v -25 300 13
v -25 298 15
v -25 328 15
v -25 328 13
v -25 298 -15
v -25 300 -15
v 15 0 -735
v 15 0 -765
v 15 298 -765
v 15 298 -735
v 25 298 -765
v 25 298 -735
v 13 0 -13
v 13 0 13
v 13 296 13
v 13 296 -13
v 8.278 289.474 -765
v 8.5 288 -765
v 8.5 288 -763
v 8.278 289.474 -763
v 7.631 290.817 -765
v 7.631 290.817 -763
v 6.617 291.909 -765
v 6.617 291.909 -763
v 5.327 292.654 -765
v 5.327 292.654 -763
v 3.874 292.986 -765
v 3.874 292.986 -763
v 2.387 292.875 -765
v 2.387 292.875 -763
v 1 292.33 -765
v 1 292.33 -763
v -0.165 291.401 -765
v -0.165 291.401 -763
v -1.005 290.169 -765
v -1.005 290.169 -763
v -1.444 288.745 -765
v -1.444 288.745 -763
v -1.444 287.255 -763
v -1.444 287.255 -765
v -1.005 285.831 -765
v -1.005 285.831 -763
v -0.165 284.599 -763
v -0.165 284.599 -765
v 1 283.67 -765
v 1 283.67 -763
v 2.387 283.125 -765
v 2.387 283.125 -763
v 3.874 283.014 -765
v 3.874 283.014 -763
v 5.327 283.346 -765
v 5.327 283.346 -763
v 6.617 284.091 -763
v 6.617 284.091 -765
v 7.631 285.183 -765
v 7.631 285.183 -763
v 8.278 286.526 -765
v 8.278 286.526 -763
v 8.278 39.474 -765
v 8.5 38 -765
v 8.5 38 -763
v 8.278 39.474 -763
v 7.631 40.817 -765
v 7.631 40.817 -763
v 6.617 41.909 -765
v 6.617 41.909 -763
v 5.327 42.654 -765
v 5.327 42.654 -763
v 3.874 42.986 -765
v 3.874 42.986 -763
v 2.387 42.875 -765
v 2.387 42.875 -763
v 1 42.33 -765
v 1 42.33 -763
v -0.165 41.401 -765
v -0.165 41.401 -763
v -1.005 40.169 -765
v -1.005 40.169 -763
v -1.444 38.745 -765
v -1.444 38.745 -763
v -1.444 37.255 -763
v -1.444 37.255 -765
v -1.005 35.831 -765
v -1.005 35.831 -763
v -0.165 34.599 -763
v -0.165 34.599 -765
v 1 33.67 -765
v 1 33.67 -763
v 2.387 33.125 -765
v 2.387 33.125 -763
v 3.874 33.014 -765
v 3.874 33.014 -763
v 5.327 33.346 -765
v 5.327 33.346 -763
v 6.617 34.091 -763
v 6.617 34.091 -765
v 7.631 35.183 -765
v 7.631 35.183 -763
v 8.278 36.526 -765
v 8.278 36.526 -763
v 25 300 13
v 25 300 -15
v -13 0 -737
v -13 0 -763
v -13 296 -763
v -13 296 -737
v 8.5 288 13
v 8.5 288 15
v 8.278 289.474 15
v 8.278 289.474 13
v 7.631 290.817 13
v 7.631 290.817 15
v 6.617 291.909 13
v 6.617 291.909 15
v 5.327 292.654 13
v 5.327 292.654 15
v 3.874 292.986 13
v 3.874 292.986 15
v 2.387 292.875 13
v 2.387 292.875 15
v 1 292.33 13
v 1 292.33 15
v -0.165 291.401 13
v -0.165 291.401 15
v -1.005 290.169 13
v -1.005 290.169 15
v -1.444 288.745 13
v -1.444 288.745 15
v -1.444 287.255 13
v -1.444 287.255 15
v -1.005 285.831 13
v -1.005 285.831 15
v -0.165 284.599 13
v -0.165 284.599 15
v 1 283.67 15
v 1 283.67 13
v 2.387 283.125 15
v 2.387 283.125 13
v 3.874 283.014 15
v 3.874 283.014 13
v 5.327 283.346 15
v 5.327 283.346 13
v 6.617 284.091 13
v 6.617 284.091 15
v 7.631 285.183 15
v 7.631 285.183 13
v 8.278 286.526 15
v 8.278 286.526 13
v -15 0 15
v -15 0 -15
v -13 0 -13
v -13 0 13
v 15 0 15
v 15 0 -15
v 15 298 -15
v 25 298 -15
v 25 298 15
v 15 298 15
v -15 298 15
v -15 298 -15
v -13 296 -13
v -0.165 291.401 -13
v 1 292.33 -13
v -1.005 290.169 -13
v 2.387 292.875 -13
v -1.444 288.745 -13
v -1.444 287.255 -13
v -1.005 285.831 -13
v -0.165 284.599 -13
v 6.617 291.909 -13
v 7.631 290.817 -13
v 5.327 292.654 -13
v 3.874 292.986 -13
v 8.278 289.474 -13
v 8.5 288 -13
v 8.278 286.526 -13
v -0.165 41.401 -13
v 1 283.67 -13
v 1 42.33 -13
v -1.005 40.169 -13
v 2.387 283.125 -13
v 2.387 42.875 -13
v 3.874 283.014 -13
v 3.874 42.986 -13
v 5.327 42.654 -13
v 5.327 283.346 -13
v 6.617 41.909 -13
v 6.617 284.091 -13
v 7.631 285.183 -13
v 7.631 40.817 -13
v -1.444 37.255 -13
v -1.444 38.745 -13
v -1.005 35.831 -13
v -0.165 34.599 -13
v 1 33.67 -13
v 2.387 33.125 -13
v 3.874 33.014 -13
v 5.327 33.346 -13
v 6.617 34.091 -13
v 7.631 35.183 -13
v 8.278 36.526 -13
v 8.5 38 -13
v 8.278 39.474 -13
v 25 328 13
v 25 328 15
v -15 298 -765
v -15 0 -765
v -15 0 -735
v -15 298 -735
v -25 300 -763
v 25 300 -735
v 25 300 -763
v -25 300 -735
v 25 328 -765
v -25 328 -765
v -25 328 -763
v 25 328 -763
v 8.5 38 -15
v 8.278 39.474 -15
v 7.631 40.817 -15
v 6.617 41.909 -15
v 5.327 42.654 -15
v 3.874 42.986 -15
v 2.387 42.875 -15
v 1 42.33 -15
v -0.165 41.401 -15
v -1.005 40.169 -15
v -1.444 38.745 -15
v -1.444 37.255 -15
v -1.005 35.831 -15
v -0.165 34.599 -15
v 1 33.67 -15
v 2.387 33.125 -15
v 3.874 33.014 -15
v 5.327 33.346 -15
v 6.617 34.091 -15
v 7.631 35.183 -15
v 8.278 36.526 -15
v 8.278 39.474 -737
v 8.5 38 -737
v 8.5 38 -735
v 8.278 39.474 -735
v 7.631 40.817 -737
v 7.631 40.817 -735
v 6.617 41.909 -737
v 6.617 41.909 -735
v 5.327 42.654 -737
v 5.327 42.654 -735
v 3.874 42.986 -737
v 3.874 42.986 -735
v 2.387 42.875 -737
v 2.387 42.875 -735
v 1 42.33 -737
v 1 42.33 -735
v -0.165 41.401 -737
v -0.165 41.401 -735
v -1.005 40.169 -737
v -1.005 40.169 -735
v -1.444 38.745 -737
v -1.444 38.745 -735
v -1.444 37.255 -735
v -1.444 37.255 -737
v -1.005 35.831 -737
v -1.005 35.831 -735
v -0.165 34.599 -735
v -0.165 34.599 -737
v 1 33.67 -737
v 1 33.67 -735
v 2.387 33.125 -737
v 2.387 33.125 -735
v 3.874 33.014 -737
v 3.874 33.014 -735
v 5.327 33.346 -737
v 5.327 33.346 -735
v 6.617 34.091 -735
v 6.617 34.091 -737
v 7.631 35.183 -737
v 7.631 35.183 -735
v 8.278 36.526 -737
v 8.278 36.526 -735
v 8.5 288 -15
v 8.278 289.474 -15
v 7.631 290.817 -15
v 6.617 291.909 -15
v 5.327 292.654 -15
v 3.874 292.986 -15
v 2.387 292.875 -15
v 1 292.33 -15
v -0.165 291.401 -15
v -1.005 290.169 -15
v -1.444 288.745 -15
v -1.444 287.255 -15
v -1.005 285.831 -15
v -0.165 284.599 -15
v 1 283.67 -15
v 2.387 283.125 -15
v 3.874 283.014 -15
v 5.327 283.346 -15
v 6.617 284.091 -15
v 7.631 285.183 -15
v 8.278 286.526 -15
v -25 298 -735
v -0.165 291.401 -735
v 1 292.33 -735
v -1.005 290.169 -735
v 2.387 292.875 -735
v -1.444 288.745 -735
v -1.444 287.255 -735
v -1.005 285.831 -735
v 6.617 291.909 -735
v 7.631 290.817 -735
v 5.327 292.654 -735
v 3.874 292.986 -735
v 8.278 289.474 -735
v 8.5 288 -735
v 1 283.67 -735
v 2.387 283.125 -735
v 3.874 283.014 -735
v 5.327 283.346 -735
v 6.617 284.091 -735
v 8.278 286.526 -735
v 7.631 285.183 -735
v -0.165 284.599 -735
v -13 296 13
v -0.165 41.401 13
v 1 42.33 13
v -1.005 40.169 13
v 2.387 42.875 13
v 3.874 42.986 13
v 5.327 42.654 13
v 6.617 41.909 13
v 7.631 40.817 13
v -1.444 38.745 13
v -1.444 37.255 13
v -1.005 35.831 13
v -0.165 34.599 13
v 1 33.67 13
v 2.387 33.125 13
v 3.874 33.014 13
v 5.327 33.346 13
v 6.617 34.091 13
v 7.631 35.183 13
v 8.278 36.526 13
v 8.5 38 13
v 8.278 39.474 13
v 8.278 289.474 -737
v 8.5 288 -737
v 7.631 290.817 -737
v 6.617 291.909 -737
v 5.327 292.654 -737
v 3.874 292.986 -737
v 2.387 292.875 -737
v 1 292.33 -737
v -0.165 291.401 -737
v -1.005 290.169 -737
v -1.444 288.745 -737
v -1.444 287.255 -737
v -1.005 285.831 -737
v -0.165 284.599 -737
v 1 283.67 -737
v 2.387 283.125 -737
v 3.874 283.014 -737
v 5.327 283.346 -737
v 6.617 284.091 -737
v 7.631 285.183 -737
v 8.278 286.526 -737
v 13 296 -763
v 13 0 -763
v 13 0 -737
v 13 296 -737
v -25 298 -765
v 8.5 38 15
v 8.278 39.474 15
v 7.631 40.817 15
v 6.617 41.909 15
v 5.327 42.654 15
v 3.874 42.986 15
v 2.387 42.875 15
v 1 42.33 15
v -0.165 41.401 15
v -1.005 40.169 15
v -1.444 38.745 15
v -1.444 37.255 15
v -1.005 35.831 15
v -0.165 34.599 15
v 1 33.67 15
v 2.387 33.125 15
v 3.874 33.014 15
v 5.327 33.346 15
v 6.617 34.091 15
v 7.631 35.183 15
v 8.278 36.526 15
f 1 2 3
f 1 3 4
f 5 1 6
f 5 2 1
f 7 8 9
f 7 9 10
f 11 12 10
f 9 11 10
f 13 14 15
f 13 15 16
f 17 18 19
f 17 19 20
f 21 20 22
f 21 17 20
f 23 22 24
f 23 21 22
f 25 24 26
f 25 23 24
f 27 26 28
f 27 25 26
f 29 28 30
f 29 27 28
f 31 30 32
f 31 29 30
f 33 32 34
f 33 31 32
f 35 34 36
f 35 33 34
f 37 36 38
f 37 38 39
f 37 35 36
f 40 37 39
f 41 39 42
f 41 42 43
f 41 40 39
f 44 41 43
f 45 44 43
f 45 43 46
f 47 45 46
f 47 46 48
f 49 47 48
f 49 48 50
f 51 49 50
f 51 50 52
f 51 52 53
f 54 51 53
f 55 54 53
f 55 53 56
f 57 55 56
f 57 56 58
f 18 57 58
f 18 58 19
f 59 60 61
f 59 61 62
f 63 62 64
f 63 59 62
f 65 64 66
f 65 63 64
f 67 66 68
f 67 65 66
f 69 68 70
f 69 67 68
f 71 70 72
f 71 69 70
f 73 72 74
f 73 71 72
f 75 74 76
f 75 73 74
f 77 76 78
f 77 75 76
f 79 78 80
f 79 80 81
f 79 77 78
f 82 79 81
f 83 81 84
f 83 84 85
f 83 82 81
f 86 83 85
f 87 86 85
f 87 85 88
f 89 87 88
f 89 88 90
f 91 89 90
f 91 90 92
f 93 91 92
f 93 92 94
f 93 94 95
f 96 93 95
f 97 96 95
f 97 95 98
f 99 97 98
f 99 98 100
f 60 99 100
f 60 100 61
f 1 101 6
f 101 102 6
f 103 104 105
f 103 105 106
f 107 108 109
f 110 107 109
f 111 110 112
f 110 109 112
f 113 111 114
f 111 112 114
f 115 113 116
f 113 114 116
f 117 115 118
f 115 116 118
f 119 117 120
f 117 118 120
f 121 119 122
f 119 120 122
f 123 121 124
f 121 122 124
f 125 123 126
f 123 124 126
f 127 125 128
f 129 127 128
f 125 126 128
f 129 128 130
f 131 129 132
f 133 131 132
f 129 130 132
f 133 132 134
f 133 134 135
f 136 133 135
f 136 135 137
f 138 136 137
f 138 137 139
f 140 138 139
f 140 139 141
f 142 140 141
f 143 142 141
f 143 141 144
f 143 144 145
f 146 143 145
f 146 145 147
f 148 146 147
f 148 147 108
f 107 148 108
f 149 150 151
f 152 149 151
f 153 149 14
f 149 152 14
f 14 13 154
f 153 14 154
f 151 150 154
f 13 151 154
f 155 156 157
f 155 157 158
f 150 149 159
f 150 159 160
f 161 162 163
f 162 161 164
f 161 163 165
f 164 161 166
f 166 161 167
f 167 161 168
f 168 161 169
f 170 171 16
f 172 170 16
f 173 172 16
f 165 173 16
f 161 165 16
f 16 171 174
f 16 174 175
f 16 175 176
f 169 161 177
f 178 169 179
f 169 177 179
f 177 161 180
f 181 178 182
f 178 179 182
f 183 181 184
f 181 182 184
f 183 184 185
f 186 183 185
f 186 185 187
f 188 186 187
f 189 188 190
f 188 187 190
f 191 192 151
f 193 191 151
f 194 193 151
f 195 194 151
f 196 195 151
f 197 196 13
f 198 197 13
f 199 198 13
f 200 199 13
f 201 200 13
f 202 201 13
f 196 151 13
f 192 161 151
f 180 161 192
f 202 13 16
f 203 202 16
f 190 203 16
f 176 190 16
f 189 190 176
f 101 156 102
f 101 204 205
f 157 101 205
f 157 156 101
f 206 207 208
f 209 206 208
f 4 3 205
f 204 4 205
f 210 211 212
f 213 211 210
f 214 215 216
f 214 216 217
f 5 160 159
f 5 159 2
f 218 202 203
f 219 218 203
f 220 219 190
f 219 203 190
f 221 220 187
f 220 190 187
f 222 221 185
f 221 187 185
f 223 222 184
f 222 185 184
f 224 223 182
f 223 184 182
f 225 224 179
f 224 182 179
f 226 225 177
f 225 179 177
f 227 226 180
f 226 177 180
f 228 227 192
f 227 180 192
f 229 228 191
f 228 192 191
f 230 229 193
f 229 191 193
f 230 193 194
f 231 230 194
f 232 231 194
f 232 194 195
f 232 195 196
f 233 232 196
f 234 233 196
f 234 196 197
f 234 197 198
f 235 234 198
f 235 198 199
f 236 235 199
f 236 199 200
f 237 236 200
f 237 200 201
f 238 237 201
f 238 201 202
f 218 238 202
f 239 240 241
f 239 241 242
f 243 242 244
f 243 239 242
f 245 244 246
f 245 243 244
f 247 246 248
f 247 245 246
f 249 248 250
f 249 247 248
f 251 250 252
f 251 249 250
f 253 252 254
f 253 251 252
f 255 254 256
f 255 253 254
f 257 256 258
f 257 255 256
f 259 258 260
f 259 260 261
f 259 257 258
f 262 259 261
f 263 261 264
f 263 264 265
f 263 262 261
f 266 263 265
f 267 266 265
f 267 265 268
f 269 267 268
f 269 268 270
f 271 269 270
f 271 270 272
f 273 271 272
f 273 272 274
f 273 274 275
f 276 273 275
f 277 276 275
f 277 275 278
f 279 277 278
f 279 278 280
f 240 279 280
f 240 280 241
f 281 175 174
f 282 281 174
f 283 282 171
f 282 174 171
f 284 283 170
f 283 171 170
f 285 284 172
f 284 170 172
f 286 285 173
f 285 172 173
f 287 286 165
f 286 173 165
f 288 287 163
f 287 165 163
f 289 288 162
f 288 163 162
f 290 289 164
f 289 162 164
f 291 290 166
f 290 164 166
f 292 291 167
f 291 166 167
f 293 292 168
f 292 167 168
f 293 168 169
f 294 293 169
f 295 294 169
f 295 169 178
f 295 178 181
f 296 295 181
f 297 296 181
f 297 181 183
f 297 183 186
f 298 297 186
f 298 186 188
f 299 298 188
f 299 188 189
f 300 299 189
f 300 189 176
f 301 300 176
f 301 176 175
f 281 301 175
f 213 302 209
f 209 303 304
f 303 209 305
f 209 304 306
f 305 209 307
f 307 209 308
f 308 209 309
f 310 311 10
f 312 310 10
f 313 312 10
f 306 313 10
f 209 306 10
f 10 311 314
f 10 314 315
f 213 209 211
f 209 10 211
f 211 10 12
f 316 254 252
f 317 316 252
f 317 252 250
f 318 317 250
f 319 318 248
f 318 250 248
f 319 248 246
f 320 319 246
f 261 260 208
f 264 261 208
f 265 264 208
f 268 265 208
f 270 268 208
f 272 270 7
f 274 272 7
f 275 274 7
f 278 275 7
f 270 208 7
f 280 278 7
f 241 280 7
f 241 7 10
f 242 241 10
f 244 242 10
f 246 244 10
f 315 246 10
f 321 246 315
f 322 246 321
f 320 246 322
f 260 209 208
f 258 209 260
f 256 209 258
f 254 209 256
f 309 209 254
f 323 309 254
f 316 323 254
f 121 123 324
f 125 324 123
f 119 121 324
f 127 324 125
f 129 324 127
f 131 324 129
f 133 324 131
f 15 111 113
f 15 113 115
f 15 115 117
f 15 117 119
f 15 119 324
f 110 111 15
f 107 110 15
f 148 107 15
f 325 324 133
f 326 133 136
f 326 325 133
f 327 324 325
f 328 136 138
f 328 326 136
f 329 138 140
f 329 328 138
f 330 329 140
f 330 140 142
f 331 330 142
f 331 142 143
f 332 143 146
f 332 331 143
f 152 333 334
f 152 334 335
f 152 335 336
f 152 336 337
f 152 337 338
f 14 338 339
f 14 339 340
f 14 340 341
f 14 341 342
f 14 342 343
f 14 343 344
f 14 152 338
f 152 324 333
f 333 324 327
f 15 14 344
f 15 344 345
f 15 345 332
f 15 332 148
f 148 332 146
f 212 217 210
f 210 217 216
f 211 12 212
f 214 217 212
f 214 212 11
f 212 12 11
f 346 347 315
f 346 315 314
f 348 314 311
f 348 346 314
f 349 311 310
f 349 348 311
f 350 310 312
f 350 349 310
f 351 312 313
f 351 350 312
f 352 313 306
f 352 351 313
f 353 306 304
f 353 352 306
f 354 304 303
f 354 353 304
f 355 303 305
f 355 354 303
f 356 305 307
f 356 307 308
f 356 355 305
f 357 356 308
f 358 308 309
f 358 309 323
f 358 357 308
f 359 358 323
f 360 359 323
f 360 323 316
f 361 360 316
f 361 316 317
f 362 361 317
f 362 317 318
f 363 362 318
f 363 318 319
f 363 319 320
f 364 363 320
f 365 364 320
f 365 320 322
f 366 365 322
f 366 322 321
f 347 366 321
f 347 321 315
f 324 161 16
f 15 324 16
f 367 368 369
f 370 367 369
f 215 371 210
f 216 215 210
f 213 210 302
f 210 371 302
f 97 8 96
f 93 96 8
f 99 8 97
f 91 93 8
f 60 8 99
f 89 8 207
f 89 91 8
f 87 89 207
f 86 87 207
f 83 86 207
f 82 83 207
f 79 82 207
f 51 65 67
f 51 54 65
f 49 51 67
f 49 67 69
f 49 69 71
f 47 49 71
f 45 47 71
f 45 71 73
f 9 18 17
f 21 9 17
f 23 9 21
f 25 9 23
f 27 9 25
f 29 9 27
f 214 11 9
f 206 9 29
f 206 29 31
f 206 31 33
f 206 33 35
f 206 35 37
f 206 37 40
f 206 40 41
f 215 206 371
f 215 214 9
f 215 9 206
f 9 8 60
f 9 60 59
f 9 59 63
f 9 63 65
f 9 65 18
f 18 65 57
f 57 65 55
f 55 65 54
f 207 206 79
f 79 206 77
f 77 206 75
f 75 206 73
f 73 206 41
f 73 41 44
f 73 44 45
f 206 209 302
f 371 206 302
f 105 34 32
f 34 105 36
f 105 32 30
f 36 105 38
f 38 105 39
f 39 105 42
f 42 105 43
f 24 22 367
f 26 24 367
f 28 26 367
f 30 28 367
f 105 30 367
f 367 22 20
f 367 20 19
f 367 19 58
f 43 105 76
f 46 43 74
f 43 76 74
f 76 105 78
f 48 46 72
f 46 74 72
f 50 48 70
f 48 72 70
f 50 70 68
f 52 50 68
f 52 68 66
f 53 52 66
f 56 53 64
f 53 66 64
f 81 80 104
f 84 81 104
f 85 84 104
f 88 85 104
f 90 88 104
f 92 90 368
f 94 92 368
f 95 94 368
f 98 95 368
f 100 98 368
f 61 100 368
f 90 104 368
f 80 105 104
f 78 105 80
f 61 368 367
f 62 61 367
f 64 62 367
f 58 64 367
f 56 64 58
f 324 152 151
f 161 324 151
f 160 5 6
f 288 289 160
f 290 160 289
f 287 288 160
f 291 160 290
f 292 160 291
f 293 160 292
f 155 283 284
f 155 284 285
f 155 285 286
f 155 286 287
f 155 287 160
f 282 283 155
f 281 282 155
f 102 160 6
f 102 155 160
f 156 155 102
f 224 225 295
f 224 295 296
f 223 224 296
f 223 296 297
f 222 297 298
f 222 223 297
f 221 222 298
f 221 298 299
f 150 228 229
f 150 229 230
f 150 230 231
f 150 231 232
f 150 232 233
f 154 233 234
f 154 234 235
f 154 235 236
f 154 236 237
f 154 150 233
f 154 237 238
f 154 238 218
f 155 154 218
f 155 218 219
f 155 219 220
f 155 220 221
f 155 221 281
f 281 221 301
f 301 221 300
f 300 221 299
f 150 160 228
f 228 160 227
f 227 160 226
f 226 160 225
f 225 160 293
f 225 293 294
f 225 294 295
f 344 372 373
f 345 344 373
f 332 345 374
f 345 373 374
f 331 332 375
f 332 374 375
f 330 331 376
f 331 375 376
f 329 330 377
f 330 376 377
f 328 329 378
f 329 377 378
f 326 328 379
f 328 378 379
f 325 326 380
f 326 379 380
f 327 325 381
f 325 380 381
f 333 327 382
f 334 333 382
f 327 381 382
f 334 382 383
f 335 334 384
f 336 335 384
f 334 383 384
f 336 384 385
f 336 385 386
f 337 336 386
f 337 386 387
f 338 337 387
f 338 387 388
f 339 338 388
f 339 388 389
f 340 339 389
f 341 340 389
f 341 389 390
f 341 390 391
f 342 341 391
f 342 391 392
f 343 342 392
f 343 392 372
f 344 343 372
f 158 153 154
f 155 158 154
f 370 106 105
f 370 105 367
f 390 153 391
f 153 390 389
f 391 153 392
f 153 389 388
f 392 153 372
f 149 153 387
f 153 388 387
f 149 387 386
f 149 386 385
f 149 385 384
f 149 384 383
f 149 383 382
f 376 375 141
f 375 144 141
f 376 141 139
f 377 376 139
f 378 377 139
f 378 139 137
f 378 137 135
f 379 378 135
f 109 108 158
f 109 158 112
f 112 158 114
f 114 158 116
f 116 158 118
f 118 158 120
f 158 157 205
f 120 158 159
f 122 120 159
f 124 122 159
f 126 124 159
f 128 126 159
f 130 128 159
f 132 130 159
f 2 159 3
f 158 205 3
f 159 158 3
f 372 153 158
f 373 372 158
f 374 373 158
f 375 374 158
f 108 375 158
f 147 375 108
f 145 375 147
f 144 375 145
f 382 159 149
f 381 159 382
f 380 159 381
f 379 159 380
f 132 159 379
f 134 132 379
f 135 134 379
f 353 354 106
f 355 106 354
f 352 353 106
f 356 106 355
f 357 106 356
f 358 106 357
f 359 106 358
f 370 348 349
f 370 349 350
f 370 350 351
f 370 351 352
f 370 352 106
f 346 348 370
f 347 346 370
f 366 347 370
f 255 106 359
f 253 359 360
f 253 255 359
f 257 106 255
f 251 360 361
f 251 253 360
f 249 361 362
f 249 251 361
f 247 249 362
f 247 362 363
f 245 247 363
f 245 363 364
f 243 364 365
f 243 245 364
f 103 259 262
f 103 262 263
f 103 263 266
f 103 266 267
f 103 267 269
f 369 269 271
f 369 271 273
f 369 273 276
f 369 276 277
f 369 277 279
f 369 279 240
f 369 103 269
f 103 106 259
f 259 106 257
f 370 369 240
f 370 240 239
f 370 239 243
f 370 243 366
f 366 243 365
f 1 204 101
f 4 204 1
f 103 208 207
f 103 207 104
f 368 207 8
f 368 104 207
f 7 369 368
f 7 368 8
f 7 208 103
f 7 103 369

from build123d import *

# Parameters (mm, degrees)
SKETCH1_W           = 30
SKETCH1_H           = 30
BOSS_EXTRUDE1_DEPTH = 298
SHELL1_T            = -2
BOSS_EXTRUDE2_DEPTH = 2
BOSS_EXTRUDE4_DEPTH = 2
SKETCH5_R           = 5
CUT_EXTRUDE1_DEPTH  = 331.316514876


with BuildPart() as part:
    # Sketch1 → Boss-Extrude1 (new body)
    with BuildSketch(Plane(origin=(0, 0, 0), x_dir=(1, 0, 0), z_dir=(0, 1, 0))):
        Rectangle(SKETCH1_W, SKETCH1_H)
    extrude(amount=BOSS_EXTRUDE1_DEPTH)

    # Shell1
    shell1_openings = [part.faces().sort_by_distance(p)[0] for p in [
        (0, 0, 0),
    ]]
    offset(amount=SHELL1_T, openings=shell1_openings, kind=Kind.INTERSECTION)

    # Sketch2 → Boss-Extrude2 (add)
    with BuildSketch(Plane.XY.offset(15)):
        Polygon((-15, 298), (-25, 298), (-25, 328), (25, 328), (25, 298), (15, 298), align=None)
    extrude(amount=-BOSS_EXTRUDE2_DEPTH)

    # Sketch3 → Boss-Extrude4 (add)
    with BuildSketch(Plane(origin=(0, 298, 0), x_dir=(1, 0, 0), z_dir=(0, 1, 0))):
        Polygon((-15, -13), (-25, -13), (-25, 15), (25, 15), (25, -13), align=None)
    extrude(amount=BOSS_EXTRUDE4_DEPTH)

    # Sketch5 → Cut-Extrude1 (cut, through all)
    with BuildSketch(Plane.XY.offset(15)):
        with Locations((3.5, 288)):
            Circle(SKETCH5_R)
        with Locations((3.5, 38)):
            Circle(SKETCH5_R)
    extrude(amount=-CUT_EXTRUDE1_DEPTH, mode=Mode.SUBTRACT)


with BuildPart() as body_2:
    # Mirror2: mirrored copy
    add(part.part.mirror(Plane.XY.offset(-375)))


solid = Compound([part.part, body_2.part])
